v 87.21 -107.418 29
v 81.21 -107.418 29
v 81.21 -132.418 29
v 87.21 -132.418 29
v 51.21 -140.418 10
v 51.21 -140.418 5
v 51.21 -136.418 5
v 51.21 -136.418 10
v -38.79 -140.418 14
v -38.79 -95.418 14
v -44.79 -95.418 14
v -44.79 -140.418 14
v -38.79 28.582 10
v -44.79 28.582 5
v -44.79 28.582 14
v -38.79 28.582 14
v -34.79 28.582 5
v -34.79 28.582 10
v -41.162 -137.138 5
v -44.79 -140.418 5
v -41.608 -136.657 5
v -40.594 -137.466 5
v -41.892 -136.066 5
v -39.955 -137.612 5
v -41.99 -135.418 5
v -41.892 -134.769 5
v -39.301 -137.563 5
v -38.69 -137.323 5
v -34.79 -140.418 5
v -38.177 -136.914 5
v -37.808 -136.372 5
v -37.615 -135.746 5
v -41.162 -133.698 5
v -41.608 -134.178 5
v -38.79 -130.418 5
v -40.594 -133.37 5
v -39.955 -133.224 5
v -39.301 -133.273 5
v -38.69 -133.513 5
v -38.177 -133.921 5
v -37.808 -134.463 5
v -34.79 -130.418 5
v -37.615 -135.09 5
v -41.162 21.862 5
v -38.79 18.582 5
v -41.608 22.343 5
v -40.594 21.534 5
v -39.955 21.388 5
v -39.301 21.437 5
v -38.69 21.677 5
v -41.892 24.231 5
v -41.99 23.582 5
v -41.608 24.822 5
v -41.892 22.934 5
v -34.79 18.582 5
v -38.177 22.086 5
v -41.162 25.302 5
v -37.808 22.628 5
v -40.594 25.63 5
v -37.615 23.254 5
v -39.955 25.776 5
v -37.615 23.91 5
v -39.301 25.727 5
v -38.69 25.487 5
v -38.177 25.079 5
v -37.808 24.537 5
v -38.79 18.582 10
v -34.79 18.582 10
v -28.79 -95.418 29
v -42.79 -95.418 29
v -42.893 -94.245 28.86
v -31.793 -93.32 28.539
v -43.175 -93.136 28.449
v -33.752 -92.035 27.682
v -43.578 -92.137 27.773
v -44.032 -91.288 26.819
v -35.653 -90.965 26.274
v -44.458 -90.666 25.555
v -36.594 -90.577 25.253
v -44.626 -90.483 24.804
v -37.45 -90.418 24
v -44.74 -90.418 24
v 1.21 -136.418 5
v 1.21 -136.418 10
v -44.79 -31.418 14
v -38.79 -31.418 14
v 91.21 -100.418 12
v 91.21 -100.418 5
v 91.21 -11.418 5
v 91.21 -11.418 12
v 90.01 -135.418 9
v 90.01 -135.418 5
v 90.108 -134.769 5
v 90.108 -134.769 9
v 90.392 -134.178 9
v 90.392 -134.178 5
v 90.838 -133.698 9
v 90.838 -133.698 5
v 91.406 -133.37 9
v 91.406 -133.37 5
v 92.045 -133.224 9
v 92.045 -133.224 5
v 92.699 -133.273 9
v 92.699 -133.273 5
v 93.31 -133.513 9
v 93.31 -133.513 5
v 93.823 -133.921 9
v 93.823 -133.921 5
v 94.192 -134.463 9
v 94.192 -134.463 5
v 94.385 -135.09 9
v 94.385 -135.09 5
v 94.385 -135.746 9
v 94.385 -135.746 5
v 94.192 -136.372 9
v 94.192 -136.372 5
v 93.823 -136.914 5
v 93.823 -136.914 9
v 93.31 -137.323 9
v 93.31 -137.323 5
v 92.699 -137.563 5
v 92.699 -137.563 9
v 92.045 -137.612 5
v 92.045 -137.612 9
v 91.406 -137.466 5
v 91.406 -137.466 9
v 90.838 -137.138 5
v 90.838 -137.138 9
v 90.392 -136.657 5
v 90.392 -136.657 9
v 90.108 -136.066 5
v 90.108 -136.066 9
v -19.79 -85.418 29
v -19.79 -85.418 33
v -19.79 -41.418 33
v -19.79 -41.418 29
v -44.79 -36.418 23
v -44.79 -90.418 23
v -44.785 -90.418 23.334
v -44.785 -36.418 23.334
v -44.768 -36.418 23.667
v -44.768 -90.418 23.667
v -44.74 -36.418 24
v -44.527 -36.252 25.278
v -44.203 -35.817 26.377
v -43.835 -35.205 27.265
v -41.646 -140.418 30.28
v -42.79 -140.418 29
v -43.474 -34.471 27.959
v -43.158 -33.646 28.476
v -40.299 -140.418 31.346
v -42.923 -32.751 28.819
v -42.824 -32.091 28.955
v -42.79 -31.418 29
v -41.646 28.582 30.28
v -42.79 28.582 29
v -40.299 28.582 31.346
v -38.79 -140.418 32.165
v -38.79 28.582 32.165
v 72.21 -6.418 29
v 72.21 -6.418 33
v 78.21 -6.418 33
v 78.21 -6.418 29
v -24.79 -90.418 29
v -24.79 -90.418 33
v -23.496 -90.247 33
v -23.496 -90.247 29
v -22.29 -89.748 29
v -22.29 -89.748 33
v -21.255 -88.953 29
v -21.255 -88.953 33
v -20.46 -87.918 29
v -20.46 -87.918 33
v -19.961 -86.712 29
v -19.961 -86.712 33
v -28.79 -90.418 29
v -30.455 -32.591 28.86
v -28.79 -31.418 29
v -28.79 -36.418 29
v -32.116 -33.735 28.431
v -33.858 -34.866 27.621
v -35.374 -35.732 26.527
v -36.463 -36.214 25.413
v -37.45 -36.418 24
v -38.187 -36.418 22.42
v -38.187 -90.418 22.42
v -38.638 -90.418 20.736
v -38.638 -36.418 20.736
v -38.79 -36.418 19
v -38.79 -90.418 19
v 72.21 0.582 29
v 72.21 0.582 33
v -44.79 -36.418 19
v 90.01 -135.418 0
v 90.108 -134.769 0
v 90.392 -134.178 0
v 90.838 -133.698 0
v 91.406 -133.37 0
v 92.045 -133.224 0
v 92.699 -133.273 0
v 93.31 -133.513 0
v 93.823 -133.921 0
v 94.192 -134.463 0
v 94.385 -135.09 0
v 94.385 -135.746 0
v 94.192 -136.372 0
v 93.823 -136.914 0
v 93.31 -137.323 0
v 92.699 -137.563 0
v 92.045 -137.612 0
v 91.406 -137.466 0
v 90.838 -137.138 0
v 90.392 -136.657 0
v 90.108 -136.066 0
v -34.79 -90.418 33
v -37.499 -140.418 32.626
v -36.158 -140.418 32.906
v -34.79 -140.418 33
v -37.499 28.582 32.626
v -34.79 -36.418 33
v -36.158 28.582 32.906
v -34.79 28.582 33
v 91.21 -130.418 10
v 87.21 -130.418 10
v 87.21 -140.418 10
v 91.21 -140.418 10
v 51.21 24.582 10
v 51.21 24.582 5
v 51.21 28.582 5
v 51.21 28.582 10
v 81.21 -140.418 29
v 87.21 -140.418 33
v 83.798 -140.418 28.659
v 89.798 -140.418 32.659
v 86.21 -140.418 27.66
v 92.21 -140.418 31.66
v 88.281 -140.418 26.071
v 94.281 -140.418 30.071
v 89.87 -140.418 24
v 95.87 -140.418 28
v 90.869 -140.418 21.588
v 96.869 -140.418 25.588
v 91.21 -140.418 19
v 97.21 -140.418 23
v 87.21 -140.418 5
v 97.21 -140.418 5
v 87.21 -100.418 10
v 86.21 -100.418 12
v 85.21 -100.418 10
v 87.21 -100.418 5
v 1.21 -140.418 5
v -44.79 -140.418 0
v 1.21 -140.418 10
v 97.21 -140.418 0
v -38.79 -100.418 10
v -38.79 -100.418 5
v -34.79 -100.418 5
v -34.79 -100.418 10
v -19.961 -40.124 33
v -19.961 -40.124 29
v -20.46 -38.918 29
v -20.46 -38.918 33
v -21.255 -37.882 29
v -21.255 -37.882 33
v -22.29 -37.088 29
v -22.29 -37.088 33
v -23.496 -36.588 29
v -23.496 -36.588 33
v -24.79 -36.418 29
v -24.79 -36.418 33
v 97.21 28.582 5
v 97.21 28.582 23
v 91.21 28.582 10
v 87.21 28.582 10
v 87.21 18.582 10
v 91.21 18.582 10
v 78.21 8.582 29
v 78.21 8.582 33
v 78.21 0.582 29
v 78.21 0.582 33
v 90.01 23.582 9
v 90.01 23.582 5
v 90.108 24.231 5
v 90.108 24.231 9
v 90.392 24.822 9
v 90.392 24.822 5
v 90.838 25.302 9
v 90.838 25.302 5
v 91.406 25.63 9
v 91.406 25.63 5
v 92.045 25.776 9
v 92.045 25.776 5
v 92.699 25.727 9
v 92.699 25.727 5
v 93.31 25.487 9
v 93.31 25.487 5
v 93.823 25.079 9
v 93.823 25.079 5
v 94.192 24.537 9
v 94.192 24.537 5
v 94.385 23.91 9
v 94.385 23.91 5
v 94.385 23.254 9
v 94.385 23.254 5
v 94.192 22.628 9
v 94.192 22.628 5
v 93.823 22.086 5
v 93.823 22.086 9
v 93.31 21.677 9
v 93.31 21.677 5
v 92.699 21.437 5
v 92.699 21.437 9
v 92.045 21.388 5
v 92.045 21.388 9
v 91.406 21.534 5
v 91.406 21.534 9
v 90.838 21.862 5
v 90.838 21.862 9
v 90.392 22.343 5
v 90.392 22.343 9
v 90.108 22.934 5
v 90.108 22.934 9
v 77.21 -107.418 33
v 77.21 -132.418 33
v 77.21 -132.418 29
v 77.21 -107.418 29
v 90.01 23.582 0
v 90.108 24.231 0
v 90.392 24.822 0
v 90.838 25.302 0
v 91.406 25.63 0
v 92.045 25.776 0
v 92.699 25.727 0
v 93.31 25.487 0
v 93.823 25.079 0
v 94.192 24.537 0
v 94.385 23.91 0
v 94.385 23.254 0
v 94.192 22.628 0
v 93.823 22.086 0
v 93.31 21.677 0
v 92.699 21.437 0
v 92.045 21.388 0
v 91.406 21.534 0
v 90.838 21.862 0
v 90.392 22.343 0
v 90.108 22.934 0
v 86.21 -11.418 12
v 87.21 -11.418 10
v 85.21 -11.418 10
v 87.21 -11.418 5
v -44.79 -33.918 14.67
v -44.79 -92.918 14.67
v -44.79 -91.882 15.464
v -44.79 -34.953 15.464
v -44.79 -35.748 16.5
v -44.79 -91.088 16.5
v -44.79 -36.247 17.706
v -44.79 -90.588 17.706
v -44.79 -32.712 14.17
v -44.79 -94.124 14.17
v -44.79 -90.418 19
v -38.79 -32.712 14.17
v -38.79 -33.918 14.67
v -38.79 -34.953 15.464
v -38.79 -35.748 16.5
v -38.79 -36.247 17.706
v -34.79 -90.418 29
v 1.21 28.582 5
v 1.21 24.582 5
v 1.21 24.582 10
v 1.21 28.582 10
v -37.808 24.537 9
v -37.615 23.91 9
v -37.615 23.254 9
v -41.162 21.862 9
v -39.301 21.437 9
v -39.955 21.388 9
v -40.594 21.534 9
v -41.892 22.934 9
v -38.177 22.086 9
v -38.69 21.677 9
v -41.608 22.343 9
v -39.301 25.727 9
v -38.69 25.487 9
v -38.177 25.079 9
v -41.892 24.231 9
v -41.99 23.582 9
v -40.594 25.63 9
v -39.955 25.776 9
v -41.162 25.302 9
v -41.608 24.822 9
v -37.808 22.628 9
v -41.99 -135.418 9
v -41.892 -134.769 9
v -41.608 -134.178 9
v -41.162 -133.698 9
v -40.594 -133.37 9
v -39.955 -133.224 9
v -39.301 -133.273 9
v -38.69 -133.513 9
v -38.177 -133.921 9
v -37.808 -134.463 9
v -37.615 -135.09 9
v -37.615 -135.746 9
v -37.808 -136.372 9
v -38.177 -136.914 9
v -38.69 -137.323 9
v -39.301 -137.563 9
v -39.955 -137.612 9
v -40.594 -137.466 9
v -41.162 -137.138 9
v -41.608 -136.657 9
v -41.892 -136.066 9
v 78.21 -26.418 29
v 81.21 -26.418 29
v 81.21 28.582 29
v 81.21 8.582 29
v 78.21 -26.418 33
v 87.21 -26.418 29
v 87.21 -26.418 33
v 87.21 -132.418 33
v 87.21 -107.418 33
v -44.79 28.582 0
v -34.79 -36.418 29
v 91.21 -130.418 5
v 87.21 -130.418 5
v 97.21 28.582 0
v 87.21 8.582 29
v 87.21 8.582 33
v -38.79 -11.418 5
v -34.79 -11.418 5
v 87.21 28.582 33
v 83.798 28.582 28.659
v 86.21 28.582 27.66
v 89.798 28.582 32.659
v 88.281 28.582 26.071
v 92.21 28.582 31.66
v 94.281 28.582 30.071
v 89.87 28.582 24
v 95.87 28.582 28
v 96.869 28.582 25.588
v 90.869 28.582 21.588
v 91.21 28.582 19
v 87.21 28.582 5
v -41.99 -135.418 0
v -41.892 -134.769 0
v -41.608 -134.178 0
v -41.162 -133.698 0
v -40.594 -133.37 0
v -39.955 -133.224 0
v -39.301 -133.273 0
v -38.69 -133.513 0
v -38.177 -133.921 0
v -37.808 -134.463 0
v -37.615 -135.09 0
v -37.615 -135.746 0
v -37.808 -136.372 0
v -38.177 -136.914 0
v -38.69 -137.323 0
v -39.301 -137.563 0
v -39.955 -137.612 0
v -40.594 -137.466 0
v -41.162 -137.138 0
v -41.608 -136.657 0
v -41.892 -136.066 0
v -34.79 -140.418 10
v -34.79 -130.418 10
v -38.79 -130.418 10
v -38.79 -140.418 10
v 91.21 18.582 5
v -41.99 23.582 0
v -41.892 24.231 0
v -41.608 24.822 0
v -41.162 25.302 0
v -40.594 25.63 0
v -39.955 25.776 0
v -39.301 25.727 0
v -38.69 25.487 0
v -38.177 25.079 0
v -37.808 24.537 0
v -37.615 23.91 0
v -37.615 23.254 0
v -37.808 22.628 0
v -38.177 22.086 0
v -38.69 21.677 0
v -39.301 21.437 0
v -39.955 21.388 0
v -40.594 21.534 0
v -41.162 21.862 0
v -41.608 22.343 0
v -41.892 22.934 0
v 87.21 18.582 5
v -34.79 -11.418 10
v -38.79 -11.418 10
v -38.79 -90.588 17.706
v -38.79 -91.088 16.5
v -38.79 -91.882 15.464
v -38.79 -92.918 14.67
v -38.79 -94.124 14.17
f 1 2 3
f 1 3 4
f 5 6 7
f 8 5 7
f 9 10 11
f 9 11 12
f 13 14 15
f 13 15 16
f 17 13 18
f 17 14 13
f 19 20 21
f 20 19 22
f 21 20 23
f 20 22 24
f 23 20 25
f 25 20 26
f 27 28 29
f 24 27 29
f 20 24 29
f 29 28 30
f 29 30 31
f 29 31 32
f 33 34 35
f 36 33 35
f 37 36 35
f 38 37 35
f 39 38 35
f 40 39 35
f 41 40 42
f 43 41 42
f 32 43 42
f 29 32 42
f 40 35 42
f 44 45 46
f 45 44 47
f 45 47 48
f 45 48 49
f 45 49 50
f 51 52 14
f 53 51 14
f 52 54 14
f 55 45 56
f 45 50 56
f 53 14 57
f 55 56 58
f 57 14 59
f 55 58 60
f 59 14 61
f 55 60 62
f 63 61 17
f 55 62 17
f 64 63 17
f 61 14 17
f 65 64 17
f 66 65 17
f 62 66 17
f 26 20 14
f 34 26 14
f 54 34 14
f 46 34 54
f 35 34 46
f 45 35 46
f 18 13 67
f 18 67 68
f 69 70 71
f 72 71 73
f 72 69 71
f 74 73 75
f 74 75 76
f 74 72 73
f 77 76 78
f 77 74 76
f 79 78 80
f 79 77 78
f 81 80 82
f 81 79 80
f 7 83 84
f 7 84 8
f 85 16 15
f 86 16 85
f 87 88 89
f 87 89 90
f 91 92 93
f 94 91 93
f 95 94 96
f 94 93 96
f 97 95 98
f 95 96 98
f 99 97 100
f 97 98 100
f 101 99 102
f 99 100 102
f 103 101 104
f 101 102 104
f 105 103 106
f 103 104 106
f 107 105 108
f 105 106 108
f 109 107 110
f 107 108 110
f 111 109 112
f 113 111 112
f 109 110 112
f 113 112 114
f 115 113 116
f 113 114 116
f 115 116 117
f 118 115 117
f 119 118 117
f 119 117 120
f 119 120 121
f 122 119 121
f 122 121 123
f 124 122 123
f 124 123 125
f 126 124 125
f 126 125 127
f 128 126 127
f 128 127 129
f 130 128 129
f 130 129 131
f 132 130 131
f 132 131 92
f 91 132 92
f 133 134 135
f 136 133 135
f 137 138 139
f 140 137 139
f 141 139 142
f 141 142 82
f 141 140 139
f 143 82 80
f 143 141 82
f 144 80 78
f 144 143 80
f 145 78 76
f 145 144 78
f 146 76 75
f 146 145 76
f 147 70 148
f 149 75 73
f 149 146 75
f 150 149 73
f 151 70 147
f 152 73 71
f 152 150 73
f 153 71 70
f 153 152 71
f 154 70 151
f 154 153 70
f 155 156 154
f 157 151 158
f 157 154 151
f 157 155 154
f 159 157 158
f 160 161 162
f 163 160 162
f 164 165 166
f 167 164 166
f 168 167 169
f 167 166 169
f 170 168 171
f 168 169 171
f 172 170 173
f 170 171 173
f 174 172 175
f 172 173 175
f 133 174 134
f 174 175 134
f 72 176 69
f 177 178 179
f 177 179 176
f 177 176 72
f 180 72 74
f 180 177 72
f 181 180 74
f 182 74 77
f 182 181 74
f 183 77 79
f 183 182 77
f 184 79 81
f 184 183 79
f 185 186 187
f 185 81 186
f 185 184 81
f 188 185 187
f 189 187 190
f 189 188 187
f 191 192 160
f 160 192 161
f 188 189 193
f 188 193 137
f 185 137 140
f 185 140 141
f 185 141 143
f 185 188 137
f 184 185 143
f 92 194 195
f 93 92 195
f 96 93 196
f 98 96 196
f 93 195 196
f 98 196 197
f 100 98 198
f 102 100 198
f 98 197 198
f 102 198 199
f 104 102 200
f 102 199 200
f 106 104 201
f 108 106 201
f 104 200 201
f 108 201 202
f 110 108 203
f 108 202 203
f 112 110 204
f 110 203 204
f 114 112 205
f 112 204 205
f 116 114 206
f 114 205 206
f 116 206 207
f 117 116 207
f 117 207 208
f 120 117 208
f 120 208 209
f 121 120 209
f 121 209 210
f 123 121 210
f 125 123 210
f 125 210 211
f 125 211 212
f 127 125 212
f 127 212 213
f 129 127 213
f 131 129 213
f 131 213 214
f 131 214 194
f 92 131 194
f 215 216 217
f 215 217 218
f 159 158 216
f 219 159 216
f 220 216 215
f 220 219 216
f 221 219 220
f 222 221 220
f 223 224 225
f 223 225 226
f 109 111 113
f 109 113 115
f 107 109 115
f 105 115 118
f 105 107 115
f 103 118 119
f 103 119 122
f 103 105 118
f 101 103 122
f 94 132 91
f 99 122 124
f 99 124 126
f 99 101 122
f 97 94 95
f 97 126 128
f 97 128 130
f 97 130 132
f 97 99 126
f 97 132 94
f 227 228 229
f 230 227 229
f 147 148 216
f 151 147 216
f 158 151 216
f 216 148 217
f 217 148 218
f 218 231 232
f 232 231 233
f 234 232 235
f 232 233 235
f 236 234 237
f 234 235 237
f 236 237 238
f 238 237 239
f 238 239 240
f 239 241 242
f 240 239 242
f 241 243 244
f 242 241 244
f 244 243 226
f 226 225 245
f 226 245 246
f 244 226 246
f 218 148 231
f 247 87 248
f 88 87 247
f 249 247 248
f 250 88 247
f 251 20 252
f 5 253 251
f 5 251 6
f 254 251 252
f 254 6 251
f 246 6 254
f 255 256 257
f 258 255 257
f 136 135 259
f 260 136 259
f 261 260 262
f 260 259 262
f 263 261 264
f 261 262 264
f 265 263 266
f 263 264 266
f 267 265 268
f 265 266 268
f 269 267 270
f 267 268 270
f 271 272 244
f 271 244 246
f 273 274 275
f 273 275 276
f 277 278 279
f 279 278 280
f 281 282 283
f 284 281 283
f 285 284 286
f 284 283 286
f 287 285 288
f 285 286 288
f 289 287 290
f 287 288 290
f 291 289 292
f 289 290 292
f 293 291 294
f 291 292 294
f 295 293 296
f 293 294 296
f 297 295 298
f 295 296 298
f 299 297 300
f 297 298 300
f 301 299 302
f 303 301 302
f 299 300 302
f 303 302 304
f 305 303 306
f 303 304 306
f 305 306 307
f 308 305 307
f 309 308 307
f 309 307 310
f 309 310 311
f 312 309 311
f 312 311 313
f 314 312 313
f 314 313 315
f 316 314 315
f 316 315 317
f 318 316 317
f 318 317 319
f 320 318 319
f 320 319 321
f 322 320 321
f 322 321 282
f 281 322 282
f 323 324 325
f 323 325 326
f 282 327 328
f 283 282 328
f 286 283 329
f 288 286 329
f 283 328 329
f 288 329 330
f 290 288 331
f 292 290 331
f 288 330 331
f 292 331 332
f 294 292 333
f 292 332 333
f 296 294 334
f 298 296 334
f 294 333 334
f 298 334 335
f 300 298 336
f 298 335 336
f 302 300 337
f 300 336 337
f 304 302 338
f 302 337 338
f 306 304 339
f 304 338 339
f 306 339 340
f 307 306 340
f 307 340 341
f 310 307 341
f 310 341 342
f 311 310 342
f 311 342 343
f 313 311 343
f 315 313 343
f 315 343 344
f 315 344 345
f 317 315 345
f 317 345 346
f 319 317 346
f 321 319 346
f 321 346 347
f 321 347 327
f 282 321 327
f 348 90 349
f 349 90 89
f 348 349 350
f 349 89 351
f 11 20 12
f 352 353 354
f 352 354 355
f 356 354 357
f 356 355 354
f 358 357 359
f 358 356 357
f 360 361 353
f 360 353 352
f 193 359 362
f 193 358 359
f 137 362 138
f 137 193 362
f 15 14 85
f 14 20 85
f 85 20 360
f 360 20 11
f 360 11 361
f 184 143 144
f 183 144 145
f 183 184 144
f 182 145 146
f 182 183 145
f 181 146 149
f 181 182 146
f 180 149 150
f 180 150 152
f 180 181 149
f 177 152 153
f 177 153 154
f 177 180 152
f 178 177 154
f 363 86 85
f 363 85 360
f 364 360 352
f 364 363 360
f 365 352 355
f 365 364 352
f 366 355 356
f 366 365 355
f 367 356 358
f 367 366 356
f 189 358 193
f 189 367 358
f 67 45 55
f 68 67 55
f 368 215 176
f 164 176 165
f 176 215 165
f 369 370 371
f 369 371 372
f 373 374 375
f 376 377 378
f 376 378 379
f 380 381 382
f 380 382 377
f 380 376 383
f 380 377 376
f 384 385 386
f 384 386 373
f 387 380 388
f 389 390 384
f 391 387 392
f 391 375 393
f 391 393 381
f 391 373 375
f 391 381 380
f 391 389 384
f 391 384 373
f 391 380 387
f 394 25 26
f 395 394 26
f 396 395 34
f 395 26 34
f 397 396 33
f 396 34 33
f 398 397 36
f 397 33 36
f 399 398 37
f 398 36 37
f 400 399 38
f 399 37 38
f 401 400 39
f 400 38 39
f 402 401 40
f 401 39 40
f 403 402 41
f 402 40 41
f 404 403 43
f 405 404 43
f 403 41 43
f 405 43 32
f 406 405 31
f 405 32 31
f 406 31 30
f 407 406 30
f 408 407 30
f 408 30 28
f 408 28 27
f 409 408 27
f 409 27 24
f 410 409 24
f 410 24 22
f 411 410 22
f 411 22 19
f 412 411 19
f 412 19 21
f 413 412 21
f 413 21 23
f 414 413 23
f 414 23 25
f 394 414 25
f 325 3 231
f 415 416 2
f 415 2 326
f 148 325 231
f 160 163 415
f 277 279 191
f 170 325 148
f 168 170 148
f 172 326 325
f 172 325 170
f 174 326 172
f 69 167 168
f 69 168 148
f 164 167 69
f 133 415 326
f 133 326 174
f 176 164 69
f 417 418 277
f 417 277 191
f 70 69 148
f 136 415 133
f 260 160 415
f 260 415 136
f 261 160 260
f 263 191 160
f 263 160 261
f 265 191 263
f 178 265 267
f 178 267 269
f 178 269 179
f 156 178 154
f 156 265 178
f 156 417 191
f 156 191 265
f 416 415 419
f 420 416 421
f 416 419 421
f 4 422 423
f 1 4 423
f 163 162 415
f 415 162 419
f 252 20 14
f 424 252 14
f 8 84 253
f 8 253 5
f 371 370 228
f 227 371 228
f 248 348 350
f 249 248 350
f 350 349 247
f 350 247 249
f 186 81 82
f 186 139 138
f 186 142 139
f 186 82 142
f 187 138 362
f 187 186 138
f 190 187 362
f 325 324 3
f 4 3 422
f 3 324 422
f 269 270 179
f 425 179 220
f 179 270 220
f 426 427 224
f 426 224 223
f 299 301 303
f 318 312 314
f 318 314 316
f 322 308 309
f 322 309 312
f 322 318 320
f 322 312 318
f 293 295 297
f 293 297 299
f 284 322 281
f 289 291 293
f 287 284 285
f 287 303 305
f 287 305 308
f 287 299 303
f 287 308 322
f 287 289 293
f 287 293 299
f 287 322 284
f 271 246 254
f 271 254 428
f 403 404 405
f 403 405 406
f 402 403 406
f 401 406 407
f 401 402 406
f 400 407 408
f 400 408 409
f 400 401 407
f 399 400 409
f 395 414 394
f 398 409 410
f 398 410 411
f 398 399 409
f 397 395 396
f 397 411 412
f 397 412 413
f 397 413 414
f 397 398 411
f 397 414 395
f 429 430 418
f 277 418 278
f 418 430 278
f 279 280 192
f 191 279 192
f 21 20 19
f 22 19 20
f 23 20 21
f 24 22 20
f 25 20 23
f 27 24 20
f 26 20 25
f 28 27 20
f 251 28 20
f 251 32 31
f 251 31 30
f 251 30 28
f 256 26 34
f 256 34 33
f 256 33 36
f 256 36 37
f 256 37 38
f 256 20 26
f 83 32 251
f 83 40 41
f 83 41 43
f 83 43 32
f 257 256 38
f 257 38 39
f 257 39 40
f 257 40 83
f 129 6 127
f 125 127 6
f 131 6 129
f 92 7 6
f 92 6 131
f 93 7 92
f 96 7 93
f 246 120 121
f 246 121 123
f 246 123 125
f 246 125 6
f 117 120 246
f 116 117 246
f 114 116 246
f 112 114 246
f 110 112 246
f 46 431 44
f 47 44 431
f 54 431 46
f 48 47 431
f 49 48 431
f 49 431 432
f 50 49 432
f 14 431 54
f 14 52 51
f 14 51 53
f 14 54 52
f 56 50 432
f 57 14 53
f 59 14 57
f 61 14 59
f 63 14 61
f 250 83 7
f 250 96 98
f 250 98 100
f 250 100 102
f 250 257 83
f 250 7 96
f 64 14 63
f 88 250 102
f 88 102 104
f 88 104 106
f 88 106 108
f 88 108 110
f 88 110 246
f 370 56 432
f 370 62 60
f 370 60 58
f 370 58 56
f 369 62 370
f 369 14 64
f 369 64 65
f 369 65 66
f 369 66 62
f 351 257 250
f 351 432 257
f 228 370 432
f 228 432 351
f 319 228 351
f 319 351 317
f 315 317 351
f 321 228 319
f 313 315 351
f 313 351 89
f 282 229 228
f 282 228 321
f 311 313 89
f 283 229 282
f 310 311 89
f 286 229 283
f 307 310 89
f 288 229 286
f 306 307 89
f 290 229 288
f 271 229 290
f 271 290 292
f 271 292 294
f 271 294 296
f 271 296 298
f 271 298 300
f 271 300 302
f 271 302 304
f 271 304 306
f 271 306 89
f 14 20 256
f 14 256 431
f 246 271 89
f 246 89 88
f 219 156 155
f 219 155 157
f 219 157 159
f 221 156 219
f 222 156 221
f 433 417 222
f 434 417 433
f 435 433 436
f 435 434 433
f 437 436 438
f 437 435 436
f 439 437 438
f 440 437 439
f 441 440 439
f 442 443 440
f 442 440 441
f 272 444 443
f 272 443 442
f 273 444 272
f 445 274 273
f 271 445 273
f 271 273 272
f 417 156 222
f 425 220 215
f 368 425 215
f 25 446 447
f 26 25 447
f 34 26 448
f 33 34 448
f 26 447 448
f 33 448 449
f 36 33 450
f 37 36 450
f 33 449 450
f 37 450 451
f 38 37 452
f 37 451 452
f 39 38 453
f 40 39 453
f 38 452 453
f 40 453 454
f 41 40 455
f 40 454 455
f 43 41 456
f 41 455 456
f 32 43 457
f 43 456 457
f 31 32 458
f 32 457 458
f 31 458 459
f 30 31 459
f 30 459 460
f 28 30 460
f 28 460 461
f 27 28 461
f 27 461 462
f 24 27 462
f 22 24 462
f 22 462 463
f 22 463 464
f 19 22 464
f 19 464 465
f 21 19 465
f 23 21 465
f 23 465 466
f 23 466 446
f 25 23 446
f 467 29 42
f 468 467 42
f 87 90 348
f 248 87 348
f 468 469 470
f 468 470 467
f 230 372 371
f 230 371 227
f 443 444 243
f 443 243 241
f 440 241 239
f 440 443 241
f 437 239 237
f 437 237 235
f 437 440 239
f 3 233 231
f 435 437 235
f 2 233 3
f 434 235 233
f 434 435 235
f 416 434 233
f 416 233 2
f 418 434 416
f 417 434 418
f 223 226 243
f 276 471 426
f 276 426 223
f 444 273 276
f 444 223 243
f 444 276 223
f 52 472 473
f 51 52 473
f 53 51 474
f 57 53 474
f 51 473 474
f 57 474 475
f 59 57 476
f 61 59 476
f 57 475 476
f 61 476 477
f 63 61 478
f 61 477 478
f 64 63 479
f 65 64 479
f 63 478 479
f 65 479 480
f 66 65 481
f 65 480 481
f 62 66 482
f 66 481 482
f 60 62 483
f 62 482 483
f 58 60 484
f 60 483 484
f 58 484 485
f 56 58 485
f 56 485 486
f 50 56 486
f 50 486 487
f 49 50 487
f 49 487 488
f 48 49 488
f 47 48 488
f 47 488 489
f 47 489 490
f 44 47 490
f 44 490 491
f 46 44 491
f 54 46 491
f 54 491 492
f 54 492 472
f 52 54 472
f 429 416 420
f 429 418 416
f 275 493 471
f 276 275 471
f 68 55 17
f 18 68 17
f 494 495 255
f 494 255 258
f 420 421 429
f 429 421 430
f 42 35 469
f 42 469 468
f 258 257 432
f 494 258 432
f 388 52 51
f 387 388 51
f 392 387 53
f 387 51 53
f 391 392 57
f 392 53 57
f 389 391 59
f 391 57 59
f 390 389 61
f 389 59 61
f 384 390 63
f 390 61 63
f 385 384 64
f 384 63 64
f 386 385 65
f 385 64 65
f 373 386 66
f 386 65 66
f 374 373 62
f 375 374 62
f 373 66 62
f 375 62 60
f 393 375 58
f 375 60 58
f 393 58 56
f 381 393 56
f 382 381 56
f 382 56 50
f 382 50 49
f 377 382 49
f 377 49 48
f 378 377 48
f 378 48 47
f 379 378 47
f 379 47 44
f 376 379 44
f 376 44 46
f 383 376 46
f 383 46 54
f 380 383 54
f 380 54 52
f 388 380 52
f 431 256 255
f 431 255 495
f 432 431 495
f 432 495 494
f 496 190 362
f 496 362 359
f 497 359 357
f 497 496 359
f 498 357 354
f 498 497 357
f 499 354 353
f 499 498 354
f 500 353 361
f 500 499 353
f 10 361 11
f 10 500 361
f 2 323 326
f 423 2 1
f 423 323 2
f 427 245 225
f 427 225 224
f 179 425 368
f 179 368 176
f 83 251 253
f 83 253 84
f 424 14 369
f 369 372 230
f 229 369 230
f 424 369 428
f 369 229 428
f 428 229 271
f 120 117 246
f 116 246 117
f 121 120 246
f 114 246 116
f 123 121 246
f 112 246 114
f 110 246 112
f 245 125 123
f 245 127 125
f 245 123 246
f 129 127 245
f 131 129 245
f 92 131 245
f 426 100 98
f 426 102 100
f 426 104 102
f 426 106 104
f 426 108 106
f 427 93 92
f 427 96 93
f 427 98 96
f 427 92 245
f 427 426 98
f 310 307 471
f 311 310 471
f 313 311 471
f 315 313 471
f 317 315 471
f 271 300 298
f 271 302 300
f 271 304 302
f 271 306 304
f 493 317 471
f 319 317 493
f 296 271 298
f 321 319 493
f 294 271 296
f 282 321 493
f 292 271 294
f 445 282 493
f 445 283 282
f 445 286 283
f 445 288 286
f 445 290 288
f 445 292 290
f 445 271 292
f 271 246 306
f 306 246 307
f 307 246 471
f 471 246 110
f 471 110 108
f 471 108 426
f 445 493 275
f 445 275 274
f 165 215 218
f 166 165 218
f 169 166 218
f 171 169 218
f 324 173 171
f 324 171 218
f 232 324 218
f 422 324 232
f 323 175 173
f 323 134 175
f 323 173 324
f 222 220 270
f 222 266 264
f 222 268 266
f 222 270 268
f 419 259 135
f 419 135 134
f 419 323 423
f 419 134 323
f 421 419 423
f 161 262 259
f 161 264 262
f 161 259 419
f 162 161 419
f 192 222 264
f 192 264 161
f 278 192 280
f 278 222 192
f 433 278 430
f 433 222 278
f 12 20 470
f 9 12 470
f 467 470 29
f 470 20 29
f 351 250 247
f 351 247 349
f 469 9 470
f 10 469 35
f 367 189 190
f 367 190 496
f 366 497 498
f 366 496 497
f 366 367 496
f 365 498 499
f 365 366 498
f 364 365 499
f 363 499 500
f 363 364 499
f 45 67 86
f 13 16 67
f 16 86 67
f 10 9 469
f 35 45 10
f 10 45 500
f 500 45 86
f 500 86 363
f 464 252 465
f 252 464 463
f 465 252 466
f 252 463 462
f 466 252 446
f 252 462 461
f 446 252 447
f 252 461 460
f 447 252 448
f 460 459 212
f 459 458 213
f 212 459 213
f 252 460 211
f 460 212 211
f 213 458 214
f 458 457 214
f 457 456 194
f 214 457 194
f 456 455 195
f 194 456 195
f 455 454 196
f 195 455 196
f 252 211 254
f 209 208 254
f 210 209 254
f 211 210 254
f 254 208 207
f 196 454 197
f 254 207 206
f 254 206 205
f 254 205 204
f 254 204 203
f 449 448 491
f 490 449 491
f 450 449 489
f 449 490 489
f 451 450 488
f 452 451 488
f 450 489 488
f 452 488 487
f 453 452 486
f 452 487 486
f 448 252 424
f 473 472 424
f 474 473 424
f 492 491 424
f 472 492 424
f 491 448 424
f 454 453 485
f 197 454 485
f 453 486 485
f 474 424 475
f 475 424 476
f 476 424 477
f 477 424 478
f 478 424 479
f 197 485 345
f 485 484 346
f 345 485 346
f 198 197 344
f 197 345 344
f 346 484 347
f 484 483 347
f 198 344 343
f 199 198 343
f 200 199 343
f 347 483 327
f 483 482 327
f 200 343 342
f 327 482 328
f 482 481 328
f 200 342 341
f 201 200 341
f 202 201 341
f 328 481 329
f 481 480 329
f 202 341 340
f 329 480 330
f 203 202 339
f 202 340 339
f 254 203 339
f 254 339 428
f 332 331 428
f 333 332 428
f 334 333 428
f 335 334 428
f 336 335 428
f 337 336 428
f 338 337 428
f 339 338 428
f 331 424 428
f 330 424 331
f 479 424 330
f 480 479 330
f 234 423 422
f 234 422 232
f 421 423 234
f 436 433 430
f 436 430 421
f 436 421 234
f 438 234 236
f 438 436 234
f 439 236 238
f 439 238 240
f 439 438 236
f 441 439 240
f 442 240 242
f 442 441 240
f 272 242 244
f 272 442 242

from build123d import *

# Parameters (mm, degrees)
SKETCH_2_W          = 130
SKETCH_2_H          = 169
EXTRUDE_1_DEPTH     = 5
SKETCH_3_W          = 50
SKETCH_3_H          = 4
SKETCH_3_W_2        = 4
SKETCH_3_H_2        = 89
EXTRUDE_2_DEPTH     = 5
EXTRUDE_3_DEPTH     = 89
SKETCH_5_W          = 6
SKETCH_5_H          = 169
EXTRUDE_4_DEPTH     = 5
EXTRUDE_5_DEPTH     = 169
SKETCH_7_W          = 4
SKETCH_7_H          = 10
EXTRUDE_6_DEPTH     = 5
SKETCH_8_R          = 2.2
CUT_EXTRUDE_1_DEPTH = 9
CUT_EXTRUDE_START   = -16
CUT_EXTRUDE_2_DEPTH = 16
SKETCH_10_W         = 10
SKETCH_10_H         = 25
CUT_EXTRUDE_3_DEPTH = 4


with BuildPart() as part:
    # 草图2 → 凸台-拉伸1 (new body)
    with BuildSketch(Plane.XY):
        with Locations((26.209829868, -55.917769376)):
            Rectangle(SKETCH_2_W, SKETCH_2_H)
    extrude(amount=EXTRUDE_1_DEPTH)

    # 草图3 → 凸台-拉伸2 (add)
    with BuildSketch(Plane.XY.offset(5)):
        with Locations((26.209829868, 26.582230624)):
            Rectangle(SKETCH_3_W, SKETCH_3_H)
        with Locations((-36.790170132, -55.917769376)):
            Rectangle(SKETCH_3_W_2, SKETCH_3_H_2)
        with Locations((26.209829868, -138.417769376)):
            Rectangle(SKETCH_3_W, SKETCH_3_H)
        with Locations((89.209829868, -55.917769376)):
            Rectangle(SKETCH_3_W_2, SKETCH_3_H_2)
    extrude(amount=EXTRUDE_2_DEPTH)

    # 草图4 → 凸台-拉伸3 (add)
    with BuildSketch(Plane(origin=(0, -11.417769376, 0), x_dir=(1, 0, 0), z_dir=(0, 1, 0))):
        Polygon((85.209829868, -10), (87.209829868, -10), (91.209829868, -10), (91.209829868, -12), (86.209829868, -12), align=None)
    extrude(amount=-EXTRUDE_3_DEPTH)

    # 草图5 → 凸台-拉伸4 (add)
    with BuildSketch(Plane.XY.offset(5)):
        with Locations((-41.790170132, -55.917769376)):
            Rectangle(SKETCH_5_W, SKETCH_5_H)
        with Locations((94.209829868, -55.917769376)):
            Rectangle(SKETCH_5_W, SKETCH_5_H)
    extrude(amount=-EXTRUDE_4_DEPTH)


with BuildPart() as body_2:
    # 草图6 → 凸台-拉伸5 (new body)
    with BuildSketch(Plane(origin=(0, 28.582230624, 0), x_dir=(1, 0, 0), z_dir=(0, 1, 0))):
        with BuildLine():
            Line((-38.790170132, -5), (-44.790170132, -5))
            Line((-44.790170132, -5), (-44.790170132, -23))
            ThreePointArc((-44.790170132, -23), (-43.156770398, -28.477225575), (-38.790170132, -32.16515139))
            ThreePointArc((-38.790170132, -32.16515139), (-36.833266569, -32.789063129), (-34.790170132, -33))
            Line((-34.790170132, -33), (87.209829868, -33))
            ThreePointArc((87.209829868, -33), (94.28089768, -30.071067812), (97.209829868, -23))
            Line((97.209829868, -23), (97.209829868, -5))
            Line((97.209829868, -5), (91.209829868, -5))
            Line((91.209829868, -5), (91.209829868, -19))
            ThreePointArc((91.209829868, -19), (88.28089768, -26.071067812), (81.209829868, -29))
            Line((81.209829868, -29), (-28.790170132, -29))
            ThreePointArc((-28.790170132, -29), (-35.861237944, -26.071067812), (-38.790170132, -19))
            Line((-38.790170132, -19), (-38.790170132, -5))
        make_face()
    extrude(amount=-EXTRUDE_5_DEPTH)

    # 草图7 → 凸台-拉伸6 (add)
    with BuildSketch(Plane.XY.offset(5)):
        with Locations((-36.790170132, -135.417769376)):
            Rectangle(SKETCH_7_W, SKETCH_7_H)
        with Locations((-36.790170132, 23.582230624)):
            Rectangle(SKETCH_7_W, SKETCH_7_H)
        with Locations((89.209829868, 23.582230624)):
            Rectangle(SKETCH_7_W, SKETCH_7_H)
        with Locations((89.209829868, -135.417769376)):
            Rectangle(SKETCH_7_W, SKETCH_7_H)
    extrude(amount=EXTRUDE_6_DEPTH)


with BuildPart() as cut_extrude_1_tool:
    # 草图8 → 切除-拉伸1 (new body)
    with BuildSketch(Plane(origin=(0, 0, 0), x_dir=(-1, 0, 0), z_dir=(0, 0, -1))):
        with Locations((39.790170132, -135.417769376)):
            Circle(SKETCH_8_R)
        with Locations((39.790170132, 23.582230624)):
            Circle(SKETCH_8_R)
        with Locations((-92.209829868, 23.582230624)):
            Circle(SKETCH_8_R)
        with Locations((-92.209829868, -135.417769376)):
            Circle(SKETCH_8_R)
    extrude(amount=-CUT_EXTRUDE_1_DEPTH)


with BuildPart() as part_1:
    add(part.part)

    # 切除-拉伸1: cut by cut_extrude_1_tool
    add(cut_extrude_1_tool.part, mode=Mode.SUBTRACT)


with BuildPart() as body_2_1:
    add(body_2.part)

    # 切除-拉伸1: cut by cut_extrude_1_tool
    add(cut_extrude_1_tool.part, mode=Mode.SUBTRACT)

    # 草图9 → 切除-拉伸2 (cut)
    with BuildSketch(Plane.ZY.offset(44.790170132).offset(CUT_EXTRUDE_START)):
        with BuildLine():
            Line((14, -95.417769376), (14, -140.417769376))
            Line((14, -140.417769376), (23, -140.417769376))
            Line((23, -140.417769376), (23, -90.417769376))
            Line((23, -90.417769376), (19, -90.417769376))
            ThreePointArc((19, -90.417769376), (15.464466094, -91.88223547), (14, -95.417769376))
        make_face()
        with BuildLine():
            Line((23, -90.417769376), (23, -140.417769376))
            Line((23, -140.417769376), (29, -140.417769376))
            Line((29, -140.417769376), (29, -95.417769376))
            ThreePointArc((29, -95.417769376), (27.535533906, -91.88223547), (24, -90.417769376))
            Line((24, -90.417769376), (23, -90.417769376))
        make_face()
        with BuildLine():
            Line((23, 28.582230624), (23, -36.417769376))
            Line((23, -36.417769376), (24, -36.417769376))
            ThreePointArc((24, -36.417769376), (27.535533906, -34.953303282), (29, -31.417769376))
            Line((29, -31.417769376), (29, 28.582230624))
            Line((29, 28.582230624), (23, 28.582230624))
        make_face()
        with BuildLine():
            Line((19, -36.417769376), (23, -36.417769376))
            Line((23, -36.417769376), (23, 28.582230624))
            Line((23, 28.582230624), (14, 28.582230624))
            Line((14, 28.582230624), (14, -31.417769376))
            ThreePointArc((14, -31.417769376), (15.464466094, -34.953303282), (19, -36.417769376))
        make_face()
    extrude(amount=CUT_EXTRUDE_2_DEPTH, mode=Mode.SUBTRACT)

    # 草图10 → 切除-拉伸3 (cut)
    with BuildSketch(Plane.XY.offset(33)):
        with BuildLine():
            Line((-34.790170132, -36.417769376), (-34.790170132, -90.417769376))
            Line((-34.790170132, -90.417769376), (-24.790170132, -90.417769376))
            ThreePointArc((-24.790170132, -90.417769376), (-21.254636226, -88.953303282), (-19.790170132, -85.417769376))
            Line((-19.790170132, -85.417769376), (-19.790170132, -41.417769376))
            ThreePointArc((-19.790170132, -41.417769376), (-21.254636226, -37.88223547), (-24.790170132, -36.417769376))
            Line((-24.790170132, -36.417769376), (-34.790170132, -36.417769376))
        make_face()
        Polygon((87.209829868, -26.417769376), (87.209829868, -11.417769376), (87.209829868, 8.582230624), (78.209829868, 8.582230624), (78.209829868, 0.582230624), (72.209829868, 0.582230624), (72.209829868, -6.417769376), (78.209829868, -6.417769376), (78.209829868, -26.417769376), align=None)
        with Locations((82.209829868, -119.917769376)):
            Rectangle(SKETCH_10_W, SKETCH_10_H)
    extrude(amount=-CUT_EXTRUDE_3_DEPTH, mode=Mode.SUBTRACT)


solid = Compound([part_1.part, body_2_1.part])
